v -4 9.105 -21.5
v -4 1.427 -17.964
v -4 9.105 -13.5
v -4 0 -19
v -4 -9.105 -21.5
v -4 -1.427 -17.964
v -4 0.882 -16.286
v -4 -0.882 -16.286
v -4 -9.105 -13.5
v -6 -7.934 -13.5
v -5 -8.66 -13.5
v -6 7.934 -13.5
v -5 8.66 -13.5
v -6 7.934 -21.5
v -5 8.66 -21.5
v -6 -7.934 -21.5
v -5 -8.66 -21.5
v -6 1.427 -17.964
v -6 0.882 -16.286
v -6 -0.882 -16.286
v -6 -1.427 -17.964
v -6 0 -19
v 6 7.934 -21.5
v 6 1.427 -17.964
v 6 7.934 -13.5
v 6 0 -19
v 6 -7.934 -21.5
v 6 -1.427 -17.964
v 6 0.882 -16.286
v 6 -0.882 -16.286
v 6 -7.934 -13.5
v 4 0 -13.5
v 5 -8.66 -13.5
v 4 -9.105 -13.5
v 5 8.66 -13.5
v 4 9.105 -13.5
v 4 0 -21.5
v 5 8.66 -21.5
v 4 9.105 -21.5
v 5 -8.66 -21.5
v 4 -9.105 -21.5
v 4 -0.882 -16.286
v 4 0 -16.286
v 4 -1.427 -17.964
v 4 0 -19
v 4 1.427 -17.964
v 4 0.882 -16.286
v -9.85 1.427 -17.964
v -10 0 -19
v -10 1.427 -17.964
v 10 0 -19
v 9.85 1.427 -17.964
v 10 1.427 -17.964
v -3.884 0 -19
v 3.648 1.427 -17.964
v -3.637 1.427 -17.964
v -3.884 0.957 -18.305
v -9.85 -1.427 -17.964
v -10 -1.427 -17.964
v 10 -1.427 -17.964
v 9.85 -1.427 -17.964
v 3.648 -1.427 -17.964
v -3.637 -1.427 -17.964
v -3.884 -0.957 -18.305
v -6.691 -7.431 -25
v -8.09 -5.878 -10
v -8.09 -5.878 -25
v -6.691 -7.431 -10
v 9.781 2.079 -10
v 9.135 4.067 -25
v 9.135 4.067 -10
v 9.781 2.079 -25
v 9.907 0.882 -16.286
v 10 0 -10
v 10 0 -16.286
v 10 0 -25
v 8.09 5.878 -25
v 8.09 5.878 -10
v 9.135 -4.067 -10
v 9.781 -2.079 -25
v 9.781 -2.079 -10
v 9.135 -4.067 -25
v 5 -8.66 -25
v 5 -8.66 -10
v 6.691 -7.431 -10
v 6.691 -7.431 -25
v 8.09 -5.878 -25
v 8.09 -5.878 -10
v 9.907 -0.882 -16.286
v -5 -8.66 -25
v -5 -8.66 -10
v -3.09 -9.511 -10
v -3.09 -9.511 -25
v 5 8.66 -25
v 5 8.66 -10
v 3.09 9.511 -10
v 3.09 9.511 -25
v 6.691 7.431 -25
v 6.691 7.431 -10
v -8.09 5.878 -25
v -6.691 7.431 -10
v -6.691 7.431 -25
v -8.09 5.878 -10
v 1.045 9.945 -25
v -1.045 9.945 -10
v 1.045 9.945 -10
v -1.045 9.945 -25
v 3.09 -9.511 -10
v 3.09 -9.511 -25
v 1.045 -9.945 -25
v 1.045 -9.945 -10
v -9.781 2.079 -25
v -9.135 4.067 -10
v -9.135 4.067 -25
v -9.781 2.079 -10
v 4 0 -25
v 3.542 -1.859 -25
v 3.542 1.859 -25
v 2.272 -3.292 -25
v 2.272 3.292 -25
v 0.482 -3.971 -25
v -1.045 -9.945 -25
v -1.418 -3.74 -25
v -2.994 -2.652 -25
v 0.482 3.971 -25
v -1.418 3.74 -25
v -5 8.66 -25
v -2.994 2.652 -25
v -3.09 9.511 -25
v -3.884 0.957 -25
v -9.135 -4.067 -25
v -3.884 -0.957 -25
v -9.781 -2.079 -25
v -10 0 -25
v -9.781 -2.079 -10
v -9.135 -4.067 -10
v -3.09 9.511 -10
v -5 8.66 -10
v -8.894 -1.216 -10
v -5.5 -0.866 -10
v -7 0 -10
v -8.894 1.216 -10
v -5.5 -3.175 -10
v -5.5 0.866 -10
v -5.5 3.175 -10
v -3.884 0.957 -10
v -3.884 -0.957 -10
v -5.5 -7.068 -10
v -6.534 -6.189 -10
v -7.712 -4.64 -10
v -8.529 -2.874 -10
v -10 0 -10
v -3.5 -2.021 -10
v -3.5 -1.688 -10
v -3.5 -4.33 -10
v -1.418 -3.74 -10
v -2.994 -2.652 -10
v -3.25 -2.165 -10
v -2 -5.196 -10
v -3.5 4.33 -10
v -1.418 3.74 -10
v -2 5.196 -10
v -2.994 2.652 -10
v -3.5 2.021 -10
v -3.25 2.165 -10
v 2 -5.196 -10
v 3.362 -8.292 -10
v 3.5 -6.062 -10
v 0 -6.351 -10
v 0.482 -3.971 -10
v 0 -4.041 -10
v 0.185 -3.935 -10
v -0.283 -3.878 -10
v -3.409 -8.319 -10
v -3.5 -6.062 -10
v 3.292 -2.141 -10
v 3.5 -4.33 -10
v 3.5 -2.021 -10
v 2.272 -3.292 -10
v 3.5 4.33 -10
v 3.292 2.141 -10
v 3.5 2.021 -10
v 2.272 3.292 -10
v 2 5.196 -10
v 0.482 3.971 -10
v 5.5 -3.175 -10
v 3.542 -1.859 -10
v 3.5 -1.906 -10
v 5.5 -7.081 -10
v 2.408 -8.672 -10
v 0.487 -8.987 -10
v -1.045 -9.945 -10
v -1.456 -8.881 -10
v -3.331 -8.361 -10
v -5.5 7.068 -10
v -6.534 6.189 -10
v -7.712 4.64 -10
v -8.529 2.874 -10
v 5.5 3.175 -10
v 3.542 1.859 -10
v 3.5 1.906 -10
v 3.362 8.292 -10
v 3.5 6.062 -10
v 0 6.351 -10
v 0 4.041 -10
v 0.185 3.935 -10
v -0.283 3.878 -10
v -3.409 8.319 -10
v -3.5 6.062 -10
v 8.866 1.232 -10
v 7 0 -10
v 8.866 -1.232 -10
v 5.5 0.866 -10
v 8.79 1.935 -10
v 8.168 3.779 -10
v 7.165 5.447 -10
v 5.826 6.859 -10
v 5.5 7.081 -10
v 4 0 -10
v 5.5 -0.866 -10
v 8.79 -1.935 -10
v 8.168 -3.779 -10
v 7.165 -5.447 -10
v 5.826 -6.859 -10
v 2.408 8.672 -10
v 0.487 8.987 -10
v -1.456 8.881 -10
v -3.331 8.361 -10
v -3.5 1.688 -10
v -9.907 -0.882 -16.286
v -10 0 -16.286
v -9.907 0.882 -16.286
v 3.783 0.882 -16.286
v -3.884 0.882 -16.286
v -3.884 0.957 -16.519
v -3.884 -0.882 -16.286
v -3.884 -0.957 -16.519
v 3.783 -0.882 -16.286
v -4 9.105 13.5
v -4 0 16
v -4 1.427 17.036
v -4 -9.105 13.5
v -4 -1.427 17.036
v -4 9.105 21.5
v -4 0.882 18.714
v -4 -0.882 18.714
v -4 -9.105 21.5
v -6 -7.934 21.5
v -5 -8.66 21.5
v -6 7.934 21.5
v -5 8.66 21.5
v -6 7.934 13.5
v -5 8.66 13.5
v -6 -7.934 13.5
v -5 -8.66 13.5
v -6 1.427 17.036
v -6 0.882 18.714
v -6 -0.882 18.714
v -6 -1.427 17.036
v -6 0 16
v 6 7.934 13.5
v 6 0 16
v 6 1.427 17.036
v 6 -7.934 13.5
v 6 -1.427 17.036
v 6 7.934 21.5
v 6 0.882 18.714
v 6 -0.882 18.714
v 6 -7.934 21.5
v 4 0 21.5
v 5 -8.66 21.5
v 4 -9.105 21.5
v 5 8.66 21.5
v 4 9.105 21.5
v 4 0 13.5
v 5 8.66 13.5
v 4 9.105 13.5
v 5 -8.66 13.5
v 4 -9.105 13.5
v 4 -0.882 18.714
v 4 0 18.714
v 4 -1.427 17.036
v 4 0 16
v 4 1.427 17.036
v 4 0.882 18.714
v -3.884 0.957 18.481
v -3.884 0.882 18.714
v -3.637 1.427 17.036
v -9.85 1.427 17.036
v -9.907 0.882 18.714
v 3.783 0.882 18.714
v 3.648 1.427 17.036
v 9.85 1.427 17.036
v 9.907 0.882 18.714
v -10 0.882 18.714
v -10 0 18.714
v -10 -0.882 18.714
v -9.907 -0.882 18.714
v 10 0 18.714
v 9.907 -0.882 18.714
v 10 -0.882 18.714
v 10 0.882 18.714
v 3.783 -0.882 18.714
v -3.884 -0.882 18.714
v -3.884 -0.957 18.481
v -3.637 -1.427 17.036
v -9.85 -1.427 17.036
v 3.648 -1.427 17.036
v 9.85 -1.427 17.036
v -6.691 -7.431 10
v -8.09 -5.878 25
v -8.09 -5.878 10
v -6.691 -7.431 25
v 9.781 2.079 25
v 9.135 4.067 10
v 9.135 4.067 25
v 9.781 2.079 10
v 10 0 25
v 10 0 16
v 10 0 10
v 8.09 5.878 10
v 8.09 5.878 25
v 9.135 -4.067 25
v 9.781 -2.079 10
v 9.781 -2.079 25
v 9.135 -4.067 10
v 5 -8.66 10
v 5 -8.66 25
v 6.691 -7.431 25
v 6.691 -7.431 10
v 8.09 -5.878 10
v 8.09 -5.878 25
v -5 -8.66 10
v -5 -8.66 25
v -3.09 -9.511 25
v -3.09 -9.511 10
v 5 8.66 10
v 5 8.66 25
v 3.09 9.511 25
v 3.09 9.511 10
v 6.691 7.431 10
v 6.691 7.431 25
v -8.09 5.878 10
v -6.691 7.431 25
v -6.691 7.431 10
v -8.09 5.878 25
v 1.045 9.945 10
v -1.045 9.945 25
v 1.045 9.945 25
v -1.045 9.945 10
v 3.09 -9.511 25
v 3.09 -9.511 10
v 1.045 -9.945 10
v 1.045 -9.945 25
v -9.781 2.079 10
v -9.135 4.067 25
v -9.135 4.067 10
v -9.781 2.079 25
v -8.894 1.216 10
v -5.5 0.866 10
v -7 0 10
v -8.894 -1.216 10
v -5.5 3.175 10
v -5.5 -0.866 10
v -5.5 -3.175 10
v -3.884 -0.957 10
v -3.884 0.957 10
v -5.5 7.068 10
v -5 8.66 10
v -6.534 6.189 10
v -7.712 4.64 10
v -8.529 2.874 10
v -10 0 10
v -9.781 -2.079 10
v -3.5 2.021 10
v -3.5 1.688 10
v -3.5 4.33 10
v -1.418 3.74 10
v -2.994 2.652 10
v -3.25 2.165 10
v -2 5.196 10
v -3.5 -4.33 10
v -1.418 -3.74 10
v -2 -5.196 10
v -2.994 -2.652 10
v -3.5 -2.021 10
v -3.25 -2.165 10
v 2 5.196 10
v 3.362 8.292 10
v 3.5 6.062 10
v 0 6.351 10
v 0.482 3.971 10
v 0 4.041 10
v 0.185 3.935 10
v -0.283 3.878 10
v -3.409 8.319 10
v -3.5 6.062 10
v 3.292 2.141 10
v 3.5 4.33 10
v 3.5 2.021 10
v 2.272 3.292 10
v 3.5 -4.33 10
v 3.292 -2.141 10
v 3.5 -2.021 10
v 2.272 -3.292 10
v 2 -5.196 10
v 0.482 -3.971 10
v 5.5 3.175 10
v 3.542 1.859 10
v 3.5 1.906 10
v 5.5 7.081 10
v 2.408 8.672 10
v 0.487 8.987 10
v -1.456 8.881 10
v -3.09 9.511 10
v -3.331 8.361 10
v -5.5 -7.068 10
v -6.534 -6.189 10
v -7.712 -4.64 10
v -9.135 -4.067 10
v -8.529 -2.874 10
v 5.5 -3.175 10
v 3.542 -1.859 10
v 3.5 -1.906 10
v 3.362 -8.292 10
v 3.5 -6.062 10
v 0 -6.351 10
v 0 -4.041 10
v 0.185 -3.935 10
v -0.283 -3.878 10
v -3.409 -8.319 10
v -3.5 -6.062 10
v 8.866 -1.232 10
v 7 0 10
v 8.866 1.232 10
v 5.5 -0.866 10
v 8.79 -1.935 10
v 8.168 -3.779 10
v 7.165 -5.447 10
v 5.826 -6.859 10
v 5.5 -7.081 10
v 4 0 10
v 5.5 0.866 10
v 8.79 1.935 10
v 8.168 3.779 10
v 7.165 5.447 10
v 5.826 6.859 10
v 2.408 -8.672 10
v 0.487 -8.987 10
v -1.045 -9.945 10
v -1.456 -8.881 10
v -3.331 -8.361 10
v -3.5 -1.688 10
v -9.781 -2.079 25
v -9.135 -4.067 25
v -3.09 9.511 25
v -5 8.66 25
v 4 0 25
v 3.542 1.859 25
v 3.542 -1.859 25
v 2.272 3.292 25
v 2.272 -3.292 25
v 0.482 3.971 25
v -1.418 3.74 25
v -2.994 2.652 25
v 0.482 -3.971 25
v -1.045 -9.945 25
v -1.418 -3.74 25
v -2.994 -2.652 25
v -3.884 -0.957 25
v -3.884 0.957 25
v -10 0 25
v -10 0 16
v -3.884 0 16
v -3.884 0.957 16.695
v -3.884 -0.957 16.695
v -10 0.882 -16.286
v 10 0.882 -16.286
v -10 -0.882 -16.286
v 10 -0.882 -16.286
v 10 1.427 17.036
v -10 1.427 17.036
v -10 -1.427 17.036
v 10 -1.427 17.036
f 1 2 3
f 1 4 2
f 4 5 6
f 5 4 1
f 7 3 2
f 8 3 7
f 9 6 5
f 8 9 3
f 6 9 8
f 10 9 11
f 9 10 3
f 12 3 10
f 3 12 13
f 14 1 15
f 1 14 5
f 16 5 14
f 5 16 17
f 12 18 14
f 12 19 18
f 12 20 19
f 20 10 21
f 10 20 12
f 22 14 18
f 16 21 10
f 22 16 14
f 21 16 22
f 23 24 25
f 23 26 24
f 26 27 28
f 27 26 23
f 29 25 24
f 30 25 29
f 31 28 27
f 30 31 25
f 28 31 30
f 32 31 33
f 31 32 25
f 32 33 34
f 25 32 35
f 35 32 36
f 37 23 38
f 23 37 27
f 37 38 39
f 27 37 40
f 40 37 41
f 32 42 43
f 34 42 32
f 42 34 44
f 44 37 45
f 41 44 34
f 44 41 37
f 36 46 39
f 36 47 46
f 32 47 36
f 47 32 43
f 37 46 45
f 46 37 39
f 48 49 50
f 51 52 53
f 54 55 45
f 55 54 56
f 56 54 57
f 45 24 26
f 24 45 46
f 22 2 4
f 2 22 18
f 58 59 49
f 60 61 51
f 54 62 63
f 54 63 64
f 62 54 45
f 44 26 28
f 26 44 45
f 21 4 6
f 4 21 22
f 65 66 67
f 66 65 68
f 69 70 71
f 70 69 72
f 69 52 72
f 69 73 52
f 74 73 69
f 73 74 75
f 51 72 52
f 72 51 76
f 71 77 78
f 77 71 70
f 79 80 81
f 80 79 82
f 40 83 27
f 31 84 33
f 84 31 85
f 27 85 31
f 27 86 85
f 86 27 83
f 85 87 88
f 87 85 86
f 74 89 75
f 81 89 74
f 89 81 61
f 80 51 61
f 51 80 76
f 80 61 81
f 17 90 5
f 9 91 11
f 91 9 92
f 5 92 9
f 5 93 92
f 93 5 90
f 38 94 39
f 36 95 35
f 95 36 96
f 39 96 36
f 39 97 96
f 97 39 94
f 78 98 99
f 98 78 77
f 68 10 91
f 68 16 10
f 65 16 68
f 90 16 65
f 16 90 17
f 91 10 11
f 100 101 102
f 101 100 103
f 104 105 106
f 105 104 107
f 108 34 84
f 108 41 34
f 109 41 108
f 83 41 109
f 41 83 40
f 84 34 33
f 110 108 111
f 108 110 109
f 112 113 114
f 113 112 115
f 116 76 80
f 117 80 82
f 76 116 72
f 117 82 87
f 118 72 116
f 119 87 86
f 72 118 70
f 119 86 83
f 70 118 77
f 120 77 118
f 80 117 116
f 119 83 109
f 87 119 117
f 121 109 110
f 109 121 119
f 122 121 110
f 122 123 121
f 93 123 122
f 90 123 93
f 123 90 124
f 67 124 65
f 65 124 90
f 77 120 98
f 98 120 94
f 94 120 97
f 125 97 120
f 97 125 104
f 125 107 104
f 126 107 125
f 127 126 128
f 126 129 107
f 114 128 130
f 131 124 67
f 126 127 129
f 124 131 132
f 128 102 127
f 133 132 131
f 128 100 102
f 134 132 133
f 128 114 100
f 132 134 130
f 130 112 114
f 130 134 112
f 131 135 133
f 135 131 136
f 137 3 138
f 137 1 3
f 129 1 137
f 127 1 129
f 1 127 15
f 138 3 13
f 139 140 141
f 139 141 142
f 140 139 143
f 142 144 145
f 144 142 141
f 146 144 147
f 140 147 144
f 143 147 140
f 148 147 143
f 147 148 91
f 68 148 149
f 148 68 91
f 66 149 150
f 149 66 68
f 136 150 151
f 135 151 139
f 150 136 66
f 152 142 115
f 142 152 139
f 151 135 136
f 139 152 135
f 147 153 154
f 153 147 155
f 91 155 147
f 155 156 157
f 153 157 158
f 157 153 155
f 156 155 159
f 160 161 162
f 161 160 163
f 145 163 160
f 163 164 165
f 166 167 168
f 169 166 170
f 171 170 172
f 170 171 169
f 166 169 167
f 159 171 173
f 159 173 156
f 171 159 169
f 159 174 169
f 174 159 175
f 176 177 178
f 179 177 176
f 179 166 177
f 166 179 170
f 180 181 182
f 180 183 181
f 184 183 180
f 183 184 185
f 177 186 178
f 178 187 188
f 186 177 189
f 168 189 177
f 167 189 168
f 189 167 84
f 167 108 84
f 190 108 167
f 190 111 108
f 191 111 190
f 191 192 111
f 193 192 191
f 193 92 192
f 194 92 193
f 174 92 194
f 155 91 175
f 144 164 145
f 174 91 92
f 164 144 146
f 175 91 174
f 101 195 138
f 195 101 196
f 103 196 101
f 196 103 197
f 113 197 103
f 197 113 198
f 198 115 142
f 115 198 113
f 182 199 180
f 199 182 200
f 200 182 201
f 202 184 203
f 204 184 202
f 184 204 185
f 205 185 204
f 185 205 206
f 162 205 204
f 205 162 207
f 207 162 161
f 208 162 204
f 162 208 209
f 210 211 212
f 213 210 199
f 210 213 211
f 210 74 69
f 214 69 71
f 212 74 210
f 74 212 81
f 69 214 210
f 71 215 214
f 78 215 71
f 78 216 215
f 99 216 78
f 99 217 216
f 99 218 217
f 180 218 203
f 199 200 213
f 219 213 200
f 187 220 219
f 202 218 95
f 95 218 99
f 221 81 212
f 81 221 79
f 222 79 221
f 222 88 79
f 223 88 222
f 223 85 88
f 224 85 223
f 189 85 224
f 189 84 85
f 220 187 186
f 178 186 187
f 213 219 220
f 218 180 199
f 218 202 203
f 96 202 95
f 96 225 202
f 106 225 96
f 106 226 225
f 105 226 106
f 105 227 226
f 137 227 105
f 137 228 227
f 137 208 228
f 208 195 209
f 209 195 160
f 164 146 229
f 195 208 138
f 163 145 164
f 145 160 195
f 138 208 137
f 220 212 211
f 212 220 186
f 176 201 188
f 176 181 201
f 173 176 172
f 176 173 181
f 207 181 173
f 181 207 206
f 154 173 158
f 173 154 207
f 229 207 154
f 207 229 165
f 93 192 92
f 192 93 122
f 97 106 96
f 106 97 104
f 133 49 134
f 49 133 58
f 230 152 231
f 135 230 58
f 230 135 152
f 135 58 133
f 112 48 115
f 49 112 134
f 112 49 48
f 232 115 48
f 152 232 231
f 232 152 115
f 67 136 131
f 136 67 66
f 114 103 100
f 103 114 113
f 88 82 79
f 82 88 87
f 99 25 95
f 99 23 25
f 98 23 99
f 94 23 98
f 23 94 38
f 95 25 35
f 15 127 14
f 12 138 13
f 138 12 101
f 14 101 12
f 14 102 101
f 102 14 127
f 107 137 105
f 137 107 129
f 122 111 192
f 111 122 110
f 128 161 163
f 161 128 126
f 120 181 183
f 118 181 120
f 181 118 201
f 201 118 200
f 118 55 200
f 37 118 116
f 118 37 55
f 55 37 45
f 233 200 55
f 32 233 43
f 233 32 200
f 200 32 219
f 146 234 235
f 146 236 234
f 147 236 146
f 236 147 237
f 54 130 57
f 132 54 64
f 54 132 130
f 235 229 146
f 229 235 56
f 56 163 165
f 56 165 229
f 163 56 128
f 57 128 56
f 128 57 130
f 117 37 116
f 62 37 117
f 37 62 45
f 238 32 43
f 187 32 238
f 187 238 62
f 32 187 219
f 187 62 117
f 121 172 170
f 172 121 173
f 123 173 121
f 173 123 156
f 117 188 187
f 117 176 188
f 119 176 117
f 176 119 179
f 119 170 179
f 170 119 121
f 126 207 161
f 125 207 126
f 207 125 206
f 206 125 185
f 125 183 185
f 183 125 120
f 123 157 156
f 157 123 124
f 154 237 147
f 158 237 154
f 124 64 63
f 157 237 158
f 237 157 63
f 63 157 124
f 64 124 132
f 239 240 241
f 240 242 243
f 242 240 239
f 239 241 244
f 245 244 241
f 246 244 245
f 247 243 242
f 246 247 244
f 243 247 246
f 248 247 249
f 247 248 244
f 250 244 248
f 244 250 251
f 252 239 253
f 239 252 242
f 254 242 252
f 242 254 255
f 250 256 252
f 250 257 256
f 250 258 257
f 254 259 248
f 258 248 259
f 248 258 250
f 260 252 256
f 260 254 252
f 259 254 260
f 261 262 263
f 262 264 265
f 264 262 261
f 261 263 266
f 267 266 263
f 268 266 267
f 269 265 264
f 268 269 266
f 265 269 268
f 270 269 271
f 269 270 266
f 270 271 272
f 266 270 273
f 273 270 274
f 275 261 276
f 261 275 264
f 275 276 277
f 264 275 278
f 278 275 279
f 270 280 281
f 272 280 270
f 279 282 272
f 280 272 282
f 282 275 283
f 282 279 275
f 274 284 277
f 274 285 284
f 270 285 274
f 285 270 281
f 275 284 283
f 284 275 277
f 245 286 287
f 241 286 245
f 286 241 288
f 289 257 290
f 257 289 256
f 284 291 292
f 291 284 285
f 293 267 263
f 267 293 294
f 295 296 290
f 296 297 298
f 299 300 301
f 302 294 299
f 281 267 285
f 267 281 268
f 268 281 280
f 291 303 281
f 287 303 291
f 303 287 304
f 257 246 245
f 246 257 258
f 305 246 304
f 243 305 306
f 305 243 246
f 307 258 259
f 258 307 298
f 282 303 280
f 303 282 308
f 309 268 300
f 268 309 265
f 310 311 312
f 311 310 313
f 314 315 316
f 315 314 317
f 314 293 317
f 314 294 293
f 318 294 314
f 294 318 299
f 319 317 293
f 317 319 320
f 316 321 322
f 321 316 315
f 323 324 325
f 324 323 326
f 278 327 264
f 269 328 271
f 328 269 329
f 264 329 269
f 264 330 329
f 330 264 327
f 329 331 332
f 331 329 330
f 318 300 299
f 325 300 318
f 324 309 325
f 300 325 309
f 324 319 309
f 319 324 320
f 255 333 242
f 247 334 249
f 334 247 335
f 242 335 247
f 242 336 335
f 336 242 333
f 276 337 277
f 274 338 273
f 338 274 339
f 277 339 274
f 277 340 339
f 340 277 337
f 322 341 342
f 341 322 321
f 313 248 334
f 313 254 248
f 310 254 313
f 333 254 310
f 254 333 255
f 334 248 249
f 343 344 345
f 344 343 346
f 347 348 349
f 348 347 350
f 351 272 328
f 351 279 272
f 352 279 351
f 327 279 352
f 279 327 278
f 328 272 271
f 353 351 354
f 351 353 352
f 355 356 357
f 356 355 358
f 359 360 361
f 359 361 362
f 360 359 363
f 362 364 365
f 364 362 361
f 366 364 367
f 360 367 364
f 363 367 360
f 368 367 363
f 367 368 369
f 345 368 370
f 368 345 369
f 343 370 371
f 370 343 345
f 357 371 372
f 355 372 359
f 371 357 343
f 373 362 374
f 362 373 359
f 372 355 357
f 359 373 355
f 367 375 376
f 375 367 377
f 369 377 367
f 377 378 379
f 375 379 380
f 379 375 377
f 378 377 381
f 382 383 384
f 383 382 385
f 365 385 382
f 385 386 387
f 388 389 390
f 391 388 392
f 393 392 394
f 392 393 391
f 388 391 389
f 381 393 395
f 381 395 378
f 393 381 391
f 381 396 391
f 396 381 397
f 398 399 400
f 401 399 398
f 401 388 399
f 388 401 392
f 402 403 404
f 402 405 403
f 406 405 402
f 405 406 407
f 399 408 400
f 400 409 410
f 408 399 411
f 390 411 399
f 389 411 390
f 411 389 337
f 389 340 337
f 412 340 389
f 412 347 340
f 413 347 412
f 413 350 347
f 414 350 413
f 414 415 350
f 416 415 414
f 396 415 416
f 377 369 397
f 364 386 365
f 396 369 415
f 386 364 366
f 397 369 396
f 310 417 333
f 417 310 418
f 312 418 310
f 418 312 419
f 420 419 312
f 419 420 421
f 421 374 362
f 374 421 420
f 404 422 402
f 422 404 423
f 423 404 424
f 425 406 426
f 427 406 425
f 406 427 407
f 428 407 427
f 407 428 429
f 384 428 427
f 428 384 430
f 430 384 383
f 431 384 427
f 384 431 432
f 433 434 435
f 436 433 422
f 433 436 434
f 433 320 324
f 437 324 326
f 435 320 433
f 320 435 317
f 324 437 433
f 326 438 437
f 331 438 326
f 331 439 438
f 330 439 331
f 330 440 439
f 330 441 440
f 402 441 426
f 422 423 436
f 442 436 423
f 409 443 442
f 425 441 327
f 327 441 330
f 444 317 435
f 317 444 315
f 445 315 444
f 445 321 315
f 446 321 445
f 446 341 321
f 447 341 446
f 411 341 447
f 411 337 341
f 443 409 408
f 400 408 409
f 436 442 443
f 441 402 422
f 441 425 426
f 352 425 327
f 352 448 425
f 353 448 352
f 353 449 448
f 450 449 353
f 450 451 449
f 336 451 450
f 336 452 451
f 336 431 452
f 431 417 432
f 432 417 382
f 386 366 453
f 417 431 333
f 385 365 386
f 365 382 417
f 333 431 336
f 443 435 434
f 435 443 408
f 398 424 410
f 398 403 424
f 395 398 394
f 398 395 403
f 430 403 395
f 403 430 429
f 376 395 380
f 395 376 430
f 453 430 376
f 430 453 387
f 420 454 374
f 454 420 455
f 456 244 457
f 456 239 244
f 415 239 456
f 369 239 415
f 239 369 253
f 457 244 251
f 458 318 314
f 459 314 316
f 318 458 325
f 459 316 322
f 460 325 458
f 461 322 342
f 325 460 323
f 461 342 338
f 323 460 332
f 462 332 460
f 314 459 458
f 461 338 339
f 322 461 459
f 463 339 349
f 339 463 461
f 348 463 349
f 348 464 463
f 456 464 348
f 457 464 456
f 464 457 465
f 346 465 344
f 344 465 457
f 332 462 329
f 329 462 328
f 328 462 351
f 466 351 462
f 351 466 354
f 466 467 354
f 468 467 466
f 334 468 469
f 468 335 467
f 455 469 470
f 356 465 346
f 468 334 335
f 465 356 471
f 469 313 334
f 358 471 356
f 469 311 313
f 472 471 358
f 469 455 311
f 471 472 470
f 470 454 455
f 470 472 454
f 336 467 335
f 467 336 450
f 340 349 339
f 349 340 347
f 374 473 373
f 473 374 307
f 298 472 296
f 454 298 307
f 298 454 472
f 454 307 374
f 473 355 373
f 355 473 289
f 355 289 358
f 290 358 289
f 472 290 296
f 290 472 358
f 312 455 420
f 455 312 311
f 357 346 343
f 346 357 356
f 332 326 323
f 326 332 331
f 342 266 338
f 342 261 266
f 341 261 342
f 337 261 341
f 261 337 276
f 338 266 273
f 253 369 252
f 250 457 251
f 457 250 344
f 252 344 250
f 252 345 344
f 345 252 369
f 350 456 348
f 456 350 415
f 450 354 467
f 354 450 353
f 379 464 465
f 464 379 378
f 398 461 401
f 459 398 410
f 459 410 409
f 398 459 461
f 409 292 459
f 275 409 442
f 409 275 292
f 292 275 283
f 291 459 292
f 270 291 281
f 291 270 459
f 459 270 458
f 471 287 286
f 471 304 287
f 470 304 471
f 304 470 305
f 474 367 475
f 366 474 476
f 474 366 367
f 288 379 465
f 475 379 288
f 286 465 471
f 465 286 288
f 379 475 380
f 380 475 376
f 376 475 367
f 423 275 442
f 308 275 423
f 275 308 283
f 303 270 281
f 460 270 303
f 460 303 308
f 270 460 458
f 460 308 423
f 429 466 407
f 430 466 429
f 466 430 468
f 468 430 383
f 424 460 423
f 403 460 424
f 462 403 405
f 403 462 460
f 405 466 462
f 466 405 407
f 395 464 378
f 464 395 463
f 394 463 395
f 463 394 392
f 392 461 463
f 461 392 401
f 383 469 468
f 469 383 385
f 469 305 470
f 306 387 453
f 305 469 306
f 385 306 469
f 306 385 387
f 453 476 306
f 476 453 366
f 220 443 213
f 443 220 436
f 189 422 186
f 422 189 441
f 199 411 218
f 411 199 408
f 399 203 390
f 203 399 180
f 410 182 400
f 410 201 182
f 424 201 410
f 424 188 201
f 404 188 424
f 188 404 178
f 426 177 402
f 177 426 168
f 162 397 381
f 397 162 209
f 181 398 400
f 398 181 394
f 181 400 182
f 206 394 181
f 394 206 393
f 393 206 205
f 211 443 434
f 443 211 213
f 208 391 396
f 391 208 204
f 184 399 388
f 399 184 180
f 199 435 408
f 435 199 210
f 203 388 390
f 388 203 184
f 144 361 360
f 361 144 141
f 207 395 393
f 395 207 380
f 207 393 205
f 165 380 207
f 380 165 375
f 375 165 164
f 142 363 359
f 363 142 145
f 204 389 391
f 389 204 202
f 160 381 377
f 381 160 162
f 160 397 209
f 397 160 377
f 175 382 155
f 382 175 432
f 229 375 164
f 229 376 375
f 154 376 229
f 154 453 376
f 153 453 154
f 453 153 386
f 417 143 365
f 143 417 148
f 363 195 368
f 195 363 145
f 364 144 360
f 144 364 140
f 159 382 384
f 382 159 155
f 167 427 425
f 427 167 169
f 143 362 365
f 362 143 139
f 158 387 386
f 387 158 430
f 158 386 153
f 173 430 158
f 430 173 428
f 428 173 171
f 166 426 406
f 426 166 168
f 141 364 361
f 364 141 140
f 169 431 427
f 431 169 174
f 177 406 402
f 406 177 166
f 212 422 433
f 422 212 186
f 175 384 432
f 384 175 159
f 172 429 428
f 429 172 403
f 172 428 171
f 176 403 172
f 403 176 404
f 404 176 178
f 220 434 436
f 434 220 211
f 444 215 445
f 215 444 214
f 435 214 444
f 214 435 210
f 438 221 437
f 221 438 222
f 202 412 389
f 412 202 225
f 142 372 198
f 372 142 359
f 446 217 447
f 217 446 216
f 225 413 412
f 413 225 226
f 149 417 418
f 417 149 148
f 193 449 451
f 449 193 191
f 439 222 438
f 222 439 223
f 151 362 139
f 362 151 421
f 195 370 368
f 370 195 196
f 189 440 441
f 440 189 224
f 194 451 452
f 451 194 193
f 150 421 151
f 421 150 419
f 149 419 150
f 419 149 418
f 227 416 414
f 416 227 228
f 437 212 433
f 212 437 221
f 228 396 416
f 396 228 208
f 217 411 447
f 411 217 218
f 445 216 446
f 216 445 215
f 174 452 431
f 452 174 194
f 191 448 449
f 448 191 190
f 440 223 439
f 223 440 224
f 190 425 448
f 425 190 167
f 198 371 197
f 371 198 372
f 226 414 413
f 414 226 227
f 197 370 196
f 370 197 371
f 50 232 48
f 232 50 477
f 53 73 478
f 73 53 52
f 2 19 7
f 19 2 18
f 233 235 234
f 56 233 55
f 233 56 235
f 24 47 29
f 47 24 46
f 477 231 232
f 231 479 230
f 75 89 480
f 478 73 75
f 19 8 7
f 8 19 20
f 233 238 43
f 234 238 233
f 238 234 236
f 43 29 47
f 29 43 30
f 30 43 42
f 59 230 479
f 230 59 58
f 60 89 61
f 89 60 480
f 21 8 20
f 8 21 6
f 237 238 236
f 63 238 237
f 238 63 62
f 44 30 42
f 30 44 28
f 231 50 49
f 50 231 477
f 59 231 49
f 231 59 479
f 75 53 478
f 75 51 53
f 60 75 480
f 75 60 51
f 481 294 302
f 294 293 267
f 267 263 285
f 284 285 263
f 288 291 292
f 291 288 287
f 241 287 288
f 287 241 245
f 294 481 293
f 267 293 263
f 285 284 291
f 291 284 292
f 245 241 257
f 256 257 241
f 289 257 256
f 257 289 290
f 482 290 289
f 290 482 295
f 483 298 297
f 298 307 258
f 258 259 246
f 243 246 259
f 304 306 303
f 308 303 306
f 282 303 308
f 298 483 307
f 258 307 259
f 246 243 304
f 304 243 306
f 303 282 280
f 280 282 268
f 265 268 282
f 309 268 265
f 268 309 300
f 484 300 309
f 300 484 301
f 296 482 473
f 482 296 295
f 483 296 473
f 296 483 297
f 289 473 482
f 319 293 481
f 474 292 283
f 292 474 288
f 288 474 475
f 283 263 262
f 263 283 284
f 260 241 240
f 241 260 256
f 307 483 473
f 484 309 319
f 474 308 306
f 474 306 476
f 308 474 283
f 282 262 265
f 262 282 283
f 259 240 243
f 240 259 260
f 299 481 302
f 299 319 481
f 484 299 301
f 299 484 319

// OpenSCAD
// Parameters
hub_diameter = 20;
hub_length = 15;
bore_diameter = 8;
slot_width = 2;
slot_depth = 8;
fastener_diameter = 3;
fastener_length = 10;
flexible_element_length = 20;
flexible_element_diameter = 18;
slot_count = 6;

// Clamping Hub Module
module clamping_hub() {
    difference() {
        // Main cylindrical hub
        cylinder(h = hub_length, d = hub_diameter, center = true);
        
        // Central bore
        cylinder(h = hub_length + 2, d = bore_diameter, center = true);
        
        // Clamping slots
        for (i = [-1, 1]) {
            translate([i * hub_diameter / 4, 0, 0])
                cube([slot_width, hub_diameter, slot_depth], center = true);
        }
        
        // Fastener holes
        for (i = [-1, 1]) {
            translate([i * hub_diameter / 4, 0, 0])
                rotate([0, 90, 0])
                cylinder(h = hub_diameter + 2, d = fastener_diameter, center = true);
        }
    }
}

// Flexible Element Module
module flexible_element() {
    difference() {
        // Main cylindrical body
        cylinder(h = flexible_element_length, d = flexible_element_diameter, center = true);
        
        // Slotted cuts for flexibility
        for (i = [0:slot_count-1]) {
            rotate([0, 0, i * (360 / slot_count)])
                translate([flexible_element_diameter / 4, 0, 0])
                cube([slot_width, flexible_element_diameter, flexible_element_length], center = true);
        }
    }
}

// Fastener Module
module fastener() {
    cylinder(h = fastener_length, d = fastener_diameter, center = true);
}

// Assembly
module flexible_coupling() {
    // Clamping Hub 1
    translate([0, 0, -flexible_element_length / 2 - hub_length / 2])
        clamping_hub();
    
    // Clamping Hub 2
    translate([0, 0, flexible_element_length / 2 + hub_length / 2])
        clamping_hub();
    
    // Flexible Element
    flexible_element();
    
    // Fasteners for Clamping Hub 1
    for (i = [-1, 1]) {
        translate([i * hub_diameter / 4, 0, -flexible_element_length / 2 - hub_length / 2])
            rotate([0, 90, 0])
            fastener();
    }
    
    // Fasteners for Clamping Hub 2
    for (i = [-1, 1]) {
        translate([i * hub_diameter / 4, 0, flexible_element_length / 2 + hub_length / 2])
            rotate([0, 90, 0])
            fastener();
    }
}

// Render the complete assembly
flexible_coupling();
